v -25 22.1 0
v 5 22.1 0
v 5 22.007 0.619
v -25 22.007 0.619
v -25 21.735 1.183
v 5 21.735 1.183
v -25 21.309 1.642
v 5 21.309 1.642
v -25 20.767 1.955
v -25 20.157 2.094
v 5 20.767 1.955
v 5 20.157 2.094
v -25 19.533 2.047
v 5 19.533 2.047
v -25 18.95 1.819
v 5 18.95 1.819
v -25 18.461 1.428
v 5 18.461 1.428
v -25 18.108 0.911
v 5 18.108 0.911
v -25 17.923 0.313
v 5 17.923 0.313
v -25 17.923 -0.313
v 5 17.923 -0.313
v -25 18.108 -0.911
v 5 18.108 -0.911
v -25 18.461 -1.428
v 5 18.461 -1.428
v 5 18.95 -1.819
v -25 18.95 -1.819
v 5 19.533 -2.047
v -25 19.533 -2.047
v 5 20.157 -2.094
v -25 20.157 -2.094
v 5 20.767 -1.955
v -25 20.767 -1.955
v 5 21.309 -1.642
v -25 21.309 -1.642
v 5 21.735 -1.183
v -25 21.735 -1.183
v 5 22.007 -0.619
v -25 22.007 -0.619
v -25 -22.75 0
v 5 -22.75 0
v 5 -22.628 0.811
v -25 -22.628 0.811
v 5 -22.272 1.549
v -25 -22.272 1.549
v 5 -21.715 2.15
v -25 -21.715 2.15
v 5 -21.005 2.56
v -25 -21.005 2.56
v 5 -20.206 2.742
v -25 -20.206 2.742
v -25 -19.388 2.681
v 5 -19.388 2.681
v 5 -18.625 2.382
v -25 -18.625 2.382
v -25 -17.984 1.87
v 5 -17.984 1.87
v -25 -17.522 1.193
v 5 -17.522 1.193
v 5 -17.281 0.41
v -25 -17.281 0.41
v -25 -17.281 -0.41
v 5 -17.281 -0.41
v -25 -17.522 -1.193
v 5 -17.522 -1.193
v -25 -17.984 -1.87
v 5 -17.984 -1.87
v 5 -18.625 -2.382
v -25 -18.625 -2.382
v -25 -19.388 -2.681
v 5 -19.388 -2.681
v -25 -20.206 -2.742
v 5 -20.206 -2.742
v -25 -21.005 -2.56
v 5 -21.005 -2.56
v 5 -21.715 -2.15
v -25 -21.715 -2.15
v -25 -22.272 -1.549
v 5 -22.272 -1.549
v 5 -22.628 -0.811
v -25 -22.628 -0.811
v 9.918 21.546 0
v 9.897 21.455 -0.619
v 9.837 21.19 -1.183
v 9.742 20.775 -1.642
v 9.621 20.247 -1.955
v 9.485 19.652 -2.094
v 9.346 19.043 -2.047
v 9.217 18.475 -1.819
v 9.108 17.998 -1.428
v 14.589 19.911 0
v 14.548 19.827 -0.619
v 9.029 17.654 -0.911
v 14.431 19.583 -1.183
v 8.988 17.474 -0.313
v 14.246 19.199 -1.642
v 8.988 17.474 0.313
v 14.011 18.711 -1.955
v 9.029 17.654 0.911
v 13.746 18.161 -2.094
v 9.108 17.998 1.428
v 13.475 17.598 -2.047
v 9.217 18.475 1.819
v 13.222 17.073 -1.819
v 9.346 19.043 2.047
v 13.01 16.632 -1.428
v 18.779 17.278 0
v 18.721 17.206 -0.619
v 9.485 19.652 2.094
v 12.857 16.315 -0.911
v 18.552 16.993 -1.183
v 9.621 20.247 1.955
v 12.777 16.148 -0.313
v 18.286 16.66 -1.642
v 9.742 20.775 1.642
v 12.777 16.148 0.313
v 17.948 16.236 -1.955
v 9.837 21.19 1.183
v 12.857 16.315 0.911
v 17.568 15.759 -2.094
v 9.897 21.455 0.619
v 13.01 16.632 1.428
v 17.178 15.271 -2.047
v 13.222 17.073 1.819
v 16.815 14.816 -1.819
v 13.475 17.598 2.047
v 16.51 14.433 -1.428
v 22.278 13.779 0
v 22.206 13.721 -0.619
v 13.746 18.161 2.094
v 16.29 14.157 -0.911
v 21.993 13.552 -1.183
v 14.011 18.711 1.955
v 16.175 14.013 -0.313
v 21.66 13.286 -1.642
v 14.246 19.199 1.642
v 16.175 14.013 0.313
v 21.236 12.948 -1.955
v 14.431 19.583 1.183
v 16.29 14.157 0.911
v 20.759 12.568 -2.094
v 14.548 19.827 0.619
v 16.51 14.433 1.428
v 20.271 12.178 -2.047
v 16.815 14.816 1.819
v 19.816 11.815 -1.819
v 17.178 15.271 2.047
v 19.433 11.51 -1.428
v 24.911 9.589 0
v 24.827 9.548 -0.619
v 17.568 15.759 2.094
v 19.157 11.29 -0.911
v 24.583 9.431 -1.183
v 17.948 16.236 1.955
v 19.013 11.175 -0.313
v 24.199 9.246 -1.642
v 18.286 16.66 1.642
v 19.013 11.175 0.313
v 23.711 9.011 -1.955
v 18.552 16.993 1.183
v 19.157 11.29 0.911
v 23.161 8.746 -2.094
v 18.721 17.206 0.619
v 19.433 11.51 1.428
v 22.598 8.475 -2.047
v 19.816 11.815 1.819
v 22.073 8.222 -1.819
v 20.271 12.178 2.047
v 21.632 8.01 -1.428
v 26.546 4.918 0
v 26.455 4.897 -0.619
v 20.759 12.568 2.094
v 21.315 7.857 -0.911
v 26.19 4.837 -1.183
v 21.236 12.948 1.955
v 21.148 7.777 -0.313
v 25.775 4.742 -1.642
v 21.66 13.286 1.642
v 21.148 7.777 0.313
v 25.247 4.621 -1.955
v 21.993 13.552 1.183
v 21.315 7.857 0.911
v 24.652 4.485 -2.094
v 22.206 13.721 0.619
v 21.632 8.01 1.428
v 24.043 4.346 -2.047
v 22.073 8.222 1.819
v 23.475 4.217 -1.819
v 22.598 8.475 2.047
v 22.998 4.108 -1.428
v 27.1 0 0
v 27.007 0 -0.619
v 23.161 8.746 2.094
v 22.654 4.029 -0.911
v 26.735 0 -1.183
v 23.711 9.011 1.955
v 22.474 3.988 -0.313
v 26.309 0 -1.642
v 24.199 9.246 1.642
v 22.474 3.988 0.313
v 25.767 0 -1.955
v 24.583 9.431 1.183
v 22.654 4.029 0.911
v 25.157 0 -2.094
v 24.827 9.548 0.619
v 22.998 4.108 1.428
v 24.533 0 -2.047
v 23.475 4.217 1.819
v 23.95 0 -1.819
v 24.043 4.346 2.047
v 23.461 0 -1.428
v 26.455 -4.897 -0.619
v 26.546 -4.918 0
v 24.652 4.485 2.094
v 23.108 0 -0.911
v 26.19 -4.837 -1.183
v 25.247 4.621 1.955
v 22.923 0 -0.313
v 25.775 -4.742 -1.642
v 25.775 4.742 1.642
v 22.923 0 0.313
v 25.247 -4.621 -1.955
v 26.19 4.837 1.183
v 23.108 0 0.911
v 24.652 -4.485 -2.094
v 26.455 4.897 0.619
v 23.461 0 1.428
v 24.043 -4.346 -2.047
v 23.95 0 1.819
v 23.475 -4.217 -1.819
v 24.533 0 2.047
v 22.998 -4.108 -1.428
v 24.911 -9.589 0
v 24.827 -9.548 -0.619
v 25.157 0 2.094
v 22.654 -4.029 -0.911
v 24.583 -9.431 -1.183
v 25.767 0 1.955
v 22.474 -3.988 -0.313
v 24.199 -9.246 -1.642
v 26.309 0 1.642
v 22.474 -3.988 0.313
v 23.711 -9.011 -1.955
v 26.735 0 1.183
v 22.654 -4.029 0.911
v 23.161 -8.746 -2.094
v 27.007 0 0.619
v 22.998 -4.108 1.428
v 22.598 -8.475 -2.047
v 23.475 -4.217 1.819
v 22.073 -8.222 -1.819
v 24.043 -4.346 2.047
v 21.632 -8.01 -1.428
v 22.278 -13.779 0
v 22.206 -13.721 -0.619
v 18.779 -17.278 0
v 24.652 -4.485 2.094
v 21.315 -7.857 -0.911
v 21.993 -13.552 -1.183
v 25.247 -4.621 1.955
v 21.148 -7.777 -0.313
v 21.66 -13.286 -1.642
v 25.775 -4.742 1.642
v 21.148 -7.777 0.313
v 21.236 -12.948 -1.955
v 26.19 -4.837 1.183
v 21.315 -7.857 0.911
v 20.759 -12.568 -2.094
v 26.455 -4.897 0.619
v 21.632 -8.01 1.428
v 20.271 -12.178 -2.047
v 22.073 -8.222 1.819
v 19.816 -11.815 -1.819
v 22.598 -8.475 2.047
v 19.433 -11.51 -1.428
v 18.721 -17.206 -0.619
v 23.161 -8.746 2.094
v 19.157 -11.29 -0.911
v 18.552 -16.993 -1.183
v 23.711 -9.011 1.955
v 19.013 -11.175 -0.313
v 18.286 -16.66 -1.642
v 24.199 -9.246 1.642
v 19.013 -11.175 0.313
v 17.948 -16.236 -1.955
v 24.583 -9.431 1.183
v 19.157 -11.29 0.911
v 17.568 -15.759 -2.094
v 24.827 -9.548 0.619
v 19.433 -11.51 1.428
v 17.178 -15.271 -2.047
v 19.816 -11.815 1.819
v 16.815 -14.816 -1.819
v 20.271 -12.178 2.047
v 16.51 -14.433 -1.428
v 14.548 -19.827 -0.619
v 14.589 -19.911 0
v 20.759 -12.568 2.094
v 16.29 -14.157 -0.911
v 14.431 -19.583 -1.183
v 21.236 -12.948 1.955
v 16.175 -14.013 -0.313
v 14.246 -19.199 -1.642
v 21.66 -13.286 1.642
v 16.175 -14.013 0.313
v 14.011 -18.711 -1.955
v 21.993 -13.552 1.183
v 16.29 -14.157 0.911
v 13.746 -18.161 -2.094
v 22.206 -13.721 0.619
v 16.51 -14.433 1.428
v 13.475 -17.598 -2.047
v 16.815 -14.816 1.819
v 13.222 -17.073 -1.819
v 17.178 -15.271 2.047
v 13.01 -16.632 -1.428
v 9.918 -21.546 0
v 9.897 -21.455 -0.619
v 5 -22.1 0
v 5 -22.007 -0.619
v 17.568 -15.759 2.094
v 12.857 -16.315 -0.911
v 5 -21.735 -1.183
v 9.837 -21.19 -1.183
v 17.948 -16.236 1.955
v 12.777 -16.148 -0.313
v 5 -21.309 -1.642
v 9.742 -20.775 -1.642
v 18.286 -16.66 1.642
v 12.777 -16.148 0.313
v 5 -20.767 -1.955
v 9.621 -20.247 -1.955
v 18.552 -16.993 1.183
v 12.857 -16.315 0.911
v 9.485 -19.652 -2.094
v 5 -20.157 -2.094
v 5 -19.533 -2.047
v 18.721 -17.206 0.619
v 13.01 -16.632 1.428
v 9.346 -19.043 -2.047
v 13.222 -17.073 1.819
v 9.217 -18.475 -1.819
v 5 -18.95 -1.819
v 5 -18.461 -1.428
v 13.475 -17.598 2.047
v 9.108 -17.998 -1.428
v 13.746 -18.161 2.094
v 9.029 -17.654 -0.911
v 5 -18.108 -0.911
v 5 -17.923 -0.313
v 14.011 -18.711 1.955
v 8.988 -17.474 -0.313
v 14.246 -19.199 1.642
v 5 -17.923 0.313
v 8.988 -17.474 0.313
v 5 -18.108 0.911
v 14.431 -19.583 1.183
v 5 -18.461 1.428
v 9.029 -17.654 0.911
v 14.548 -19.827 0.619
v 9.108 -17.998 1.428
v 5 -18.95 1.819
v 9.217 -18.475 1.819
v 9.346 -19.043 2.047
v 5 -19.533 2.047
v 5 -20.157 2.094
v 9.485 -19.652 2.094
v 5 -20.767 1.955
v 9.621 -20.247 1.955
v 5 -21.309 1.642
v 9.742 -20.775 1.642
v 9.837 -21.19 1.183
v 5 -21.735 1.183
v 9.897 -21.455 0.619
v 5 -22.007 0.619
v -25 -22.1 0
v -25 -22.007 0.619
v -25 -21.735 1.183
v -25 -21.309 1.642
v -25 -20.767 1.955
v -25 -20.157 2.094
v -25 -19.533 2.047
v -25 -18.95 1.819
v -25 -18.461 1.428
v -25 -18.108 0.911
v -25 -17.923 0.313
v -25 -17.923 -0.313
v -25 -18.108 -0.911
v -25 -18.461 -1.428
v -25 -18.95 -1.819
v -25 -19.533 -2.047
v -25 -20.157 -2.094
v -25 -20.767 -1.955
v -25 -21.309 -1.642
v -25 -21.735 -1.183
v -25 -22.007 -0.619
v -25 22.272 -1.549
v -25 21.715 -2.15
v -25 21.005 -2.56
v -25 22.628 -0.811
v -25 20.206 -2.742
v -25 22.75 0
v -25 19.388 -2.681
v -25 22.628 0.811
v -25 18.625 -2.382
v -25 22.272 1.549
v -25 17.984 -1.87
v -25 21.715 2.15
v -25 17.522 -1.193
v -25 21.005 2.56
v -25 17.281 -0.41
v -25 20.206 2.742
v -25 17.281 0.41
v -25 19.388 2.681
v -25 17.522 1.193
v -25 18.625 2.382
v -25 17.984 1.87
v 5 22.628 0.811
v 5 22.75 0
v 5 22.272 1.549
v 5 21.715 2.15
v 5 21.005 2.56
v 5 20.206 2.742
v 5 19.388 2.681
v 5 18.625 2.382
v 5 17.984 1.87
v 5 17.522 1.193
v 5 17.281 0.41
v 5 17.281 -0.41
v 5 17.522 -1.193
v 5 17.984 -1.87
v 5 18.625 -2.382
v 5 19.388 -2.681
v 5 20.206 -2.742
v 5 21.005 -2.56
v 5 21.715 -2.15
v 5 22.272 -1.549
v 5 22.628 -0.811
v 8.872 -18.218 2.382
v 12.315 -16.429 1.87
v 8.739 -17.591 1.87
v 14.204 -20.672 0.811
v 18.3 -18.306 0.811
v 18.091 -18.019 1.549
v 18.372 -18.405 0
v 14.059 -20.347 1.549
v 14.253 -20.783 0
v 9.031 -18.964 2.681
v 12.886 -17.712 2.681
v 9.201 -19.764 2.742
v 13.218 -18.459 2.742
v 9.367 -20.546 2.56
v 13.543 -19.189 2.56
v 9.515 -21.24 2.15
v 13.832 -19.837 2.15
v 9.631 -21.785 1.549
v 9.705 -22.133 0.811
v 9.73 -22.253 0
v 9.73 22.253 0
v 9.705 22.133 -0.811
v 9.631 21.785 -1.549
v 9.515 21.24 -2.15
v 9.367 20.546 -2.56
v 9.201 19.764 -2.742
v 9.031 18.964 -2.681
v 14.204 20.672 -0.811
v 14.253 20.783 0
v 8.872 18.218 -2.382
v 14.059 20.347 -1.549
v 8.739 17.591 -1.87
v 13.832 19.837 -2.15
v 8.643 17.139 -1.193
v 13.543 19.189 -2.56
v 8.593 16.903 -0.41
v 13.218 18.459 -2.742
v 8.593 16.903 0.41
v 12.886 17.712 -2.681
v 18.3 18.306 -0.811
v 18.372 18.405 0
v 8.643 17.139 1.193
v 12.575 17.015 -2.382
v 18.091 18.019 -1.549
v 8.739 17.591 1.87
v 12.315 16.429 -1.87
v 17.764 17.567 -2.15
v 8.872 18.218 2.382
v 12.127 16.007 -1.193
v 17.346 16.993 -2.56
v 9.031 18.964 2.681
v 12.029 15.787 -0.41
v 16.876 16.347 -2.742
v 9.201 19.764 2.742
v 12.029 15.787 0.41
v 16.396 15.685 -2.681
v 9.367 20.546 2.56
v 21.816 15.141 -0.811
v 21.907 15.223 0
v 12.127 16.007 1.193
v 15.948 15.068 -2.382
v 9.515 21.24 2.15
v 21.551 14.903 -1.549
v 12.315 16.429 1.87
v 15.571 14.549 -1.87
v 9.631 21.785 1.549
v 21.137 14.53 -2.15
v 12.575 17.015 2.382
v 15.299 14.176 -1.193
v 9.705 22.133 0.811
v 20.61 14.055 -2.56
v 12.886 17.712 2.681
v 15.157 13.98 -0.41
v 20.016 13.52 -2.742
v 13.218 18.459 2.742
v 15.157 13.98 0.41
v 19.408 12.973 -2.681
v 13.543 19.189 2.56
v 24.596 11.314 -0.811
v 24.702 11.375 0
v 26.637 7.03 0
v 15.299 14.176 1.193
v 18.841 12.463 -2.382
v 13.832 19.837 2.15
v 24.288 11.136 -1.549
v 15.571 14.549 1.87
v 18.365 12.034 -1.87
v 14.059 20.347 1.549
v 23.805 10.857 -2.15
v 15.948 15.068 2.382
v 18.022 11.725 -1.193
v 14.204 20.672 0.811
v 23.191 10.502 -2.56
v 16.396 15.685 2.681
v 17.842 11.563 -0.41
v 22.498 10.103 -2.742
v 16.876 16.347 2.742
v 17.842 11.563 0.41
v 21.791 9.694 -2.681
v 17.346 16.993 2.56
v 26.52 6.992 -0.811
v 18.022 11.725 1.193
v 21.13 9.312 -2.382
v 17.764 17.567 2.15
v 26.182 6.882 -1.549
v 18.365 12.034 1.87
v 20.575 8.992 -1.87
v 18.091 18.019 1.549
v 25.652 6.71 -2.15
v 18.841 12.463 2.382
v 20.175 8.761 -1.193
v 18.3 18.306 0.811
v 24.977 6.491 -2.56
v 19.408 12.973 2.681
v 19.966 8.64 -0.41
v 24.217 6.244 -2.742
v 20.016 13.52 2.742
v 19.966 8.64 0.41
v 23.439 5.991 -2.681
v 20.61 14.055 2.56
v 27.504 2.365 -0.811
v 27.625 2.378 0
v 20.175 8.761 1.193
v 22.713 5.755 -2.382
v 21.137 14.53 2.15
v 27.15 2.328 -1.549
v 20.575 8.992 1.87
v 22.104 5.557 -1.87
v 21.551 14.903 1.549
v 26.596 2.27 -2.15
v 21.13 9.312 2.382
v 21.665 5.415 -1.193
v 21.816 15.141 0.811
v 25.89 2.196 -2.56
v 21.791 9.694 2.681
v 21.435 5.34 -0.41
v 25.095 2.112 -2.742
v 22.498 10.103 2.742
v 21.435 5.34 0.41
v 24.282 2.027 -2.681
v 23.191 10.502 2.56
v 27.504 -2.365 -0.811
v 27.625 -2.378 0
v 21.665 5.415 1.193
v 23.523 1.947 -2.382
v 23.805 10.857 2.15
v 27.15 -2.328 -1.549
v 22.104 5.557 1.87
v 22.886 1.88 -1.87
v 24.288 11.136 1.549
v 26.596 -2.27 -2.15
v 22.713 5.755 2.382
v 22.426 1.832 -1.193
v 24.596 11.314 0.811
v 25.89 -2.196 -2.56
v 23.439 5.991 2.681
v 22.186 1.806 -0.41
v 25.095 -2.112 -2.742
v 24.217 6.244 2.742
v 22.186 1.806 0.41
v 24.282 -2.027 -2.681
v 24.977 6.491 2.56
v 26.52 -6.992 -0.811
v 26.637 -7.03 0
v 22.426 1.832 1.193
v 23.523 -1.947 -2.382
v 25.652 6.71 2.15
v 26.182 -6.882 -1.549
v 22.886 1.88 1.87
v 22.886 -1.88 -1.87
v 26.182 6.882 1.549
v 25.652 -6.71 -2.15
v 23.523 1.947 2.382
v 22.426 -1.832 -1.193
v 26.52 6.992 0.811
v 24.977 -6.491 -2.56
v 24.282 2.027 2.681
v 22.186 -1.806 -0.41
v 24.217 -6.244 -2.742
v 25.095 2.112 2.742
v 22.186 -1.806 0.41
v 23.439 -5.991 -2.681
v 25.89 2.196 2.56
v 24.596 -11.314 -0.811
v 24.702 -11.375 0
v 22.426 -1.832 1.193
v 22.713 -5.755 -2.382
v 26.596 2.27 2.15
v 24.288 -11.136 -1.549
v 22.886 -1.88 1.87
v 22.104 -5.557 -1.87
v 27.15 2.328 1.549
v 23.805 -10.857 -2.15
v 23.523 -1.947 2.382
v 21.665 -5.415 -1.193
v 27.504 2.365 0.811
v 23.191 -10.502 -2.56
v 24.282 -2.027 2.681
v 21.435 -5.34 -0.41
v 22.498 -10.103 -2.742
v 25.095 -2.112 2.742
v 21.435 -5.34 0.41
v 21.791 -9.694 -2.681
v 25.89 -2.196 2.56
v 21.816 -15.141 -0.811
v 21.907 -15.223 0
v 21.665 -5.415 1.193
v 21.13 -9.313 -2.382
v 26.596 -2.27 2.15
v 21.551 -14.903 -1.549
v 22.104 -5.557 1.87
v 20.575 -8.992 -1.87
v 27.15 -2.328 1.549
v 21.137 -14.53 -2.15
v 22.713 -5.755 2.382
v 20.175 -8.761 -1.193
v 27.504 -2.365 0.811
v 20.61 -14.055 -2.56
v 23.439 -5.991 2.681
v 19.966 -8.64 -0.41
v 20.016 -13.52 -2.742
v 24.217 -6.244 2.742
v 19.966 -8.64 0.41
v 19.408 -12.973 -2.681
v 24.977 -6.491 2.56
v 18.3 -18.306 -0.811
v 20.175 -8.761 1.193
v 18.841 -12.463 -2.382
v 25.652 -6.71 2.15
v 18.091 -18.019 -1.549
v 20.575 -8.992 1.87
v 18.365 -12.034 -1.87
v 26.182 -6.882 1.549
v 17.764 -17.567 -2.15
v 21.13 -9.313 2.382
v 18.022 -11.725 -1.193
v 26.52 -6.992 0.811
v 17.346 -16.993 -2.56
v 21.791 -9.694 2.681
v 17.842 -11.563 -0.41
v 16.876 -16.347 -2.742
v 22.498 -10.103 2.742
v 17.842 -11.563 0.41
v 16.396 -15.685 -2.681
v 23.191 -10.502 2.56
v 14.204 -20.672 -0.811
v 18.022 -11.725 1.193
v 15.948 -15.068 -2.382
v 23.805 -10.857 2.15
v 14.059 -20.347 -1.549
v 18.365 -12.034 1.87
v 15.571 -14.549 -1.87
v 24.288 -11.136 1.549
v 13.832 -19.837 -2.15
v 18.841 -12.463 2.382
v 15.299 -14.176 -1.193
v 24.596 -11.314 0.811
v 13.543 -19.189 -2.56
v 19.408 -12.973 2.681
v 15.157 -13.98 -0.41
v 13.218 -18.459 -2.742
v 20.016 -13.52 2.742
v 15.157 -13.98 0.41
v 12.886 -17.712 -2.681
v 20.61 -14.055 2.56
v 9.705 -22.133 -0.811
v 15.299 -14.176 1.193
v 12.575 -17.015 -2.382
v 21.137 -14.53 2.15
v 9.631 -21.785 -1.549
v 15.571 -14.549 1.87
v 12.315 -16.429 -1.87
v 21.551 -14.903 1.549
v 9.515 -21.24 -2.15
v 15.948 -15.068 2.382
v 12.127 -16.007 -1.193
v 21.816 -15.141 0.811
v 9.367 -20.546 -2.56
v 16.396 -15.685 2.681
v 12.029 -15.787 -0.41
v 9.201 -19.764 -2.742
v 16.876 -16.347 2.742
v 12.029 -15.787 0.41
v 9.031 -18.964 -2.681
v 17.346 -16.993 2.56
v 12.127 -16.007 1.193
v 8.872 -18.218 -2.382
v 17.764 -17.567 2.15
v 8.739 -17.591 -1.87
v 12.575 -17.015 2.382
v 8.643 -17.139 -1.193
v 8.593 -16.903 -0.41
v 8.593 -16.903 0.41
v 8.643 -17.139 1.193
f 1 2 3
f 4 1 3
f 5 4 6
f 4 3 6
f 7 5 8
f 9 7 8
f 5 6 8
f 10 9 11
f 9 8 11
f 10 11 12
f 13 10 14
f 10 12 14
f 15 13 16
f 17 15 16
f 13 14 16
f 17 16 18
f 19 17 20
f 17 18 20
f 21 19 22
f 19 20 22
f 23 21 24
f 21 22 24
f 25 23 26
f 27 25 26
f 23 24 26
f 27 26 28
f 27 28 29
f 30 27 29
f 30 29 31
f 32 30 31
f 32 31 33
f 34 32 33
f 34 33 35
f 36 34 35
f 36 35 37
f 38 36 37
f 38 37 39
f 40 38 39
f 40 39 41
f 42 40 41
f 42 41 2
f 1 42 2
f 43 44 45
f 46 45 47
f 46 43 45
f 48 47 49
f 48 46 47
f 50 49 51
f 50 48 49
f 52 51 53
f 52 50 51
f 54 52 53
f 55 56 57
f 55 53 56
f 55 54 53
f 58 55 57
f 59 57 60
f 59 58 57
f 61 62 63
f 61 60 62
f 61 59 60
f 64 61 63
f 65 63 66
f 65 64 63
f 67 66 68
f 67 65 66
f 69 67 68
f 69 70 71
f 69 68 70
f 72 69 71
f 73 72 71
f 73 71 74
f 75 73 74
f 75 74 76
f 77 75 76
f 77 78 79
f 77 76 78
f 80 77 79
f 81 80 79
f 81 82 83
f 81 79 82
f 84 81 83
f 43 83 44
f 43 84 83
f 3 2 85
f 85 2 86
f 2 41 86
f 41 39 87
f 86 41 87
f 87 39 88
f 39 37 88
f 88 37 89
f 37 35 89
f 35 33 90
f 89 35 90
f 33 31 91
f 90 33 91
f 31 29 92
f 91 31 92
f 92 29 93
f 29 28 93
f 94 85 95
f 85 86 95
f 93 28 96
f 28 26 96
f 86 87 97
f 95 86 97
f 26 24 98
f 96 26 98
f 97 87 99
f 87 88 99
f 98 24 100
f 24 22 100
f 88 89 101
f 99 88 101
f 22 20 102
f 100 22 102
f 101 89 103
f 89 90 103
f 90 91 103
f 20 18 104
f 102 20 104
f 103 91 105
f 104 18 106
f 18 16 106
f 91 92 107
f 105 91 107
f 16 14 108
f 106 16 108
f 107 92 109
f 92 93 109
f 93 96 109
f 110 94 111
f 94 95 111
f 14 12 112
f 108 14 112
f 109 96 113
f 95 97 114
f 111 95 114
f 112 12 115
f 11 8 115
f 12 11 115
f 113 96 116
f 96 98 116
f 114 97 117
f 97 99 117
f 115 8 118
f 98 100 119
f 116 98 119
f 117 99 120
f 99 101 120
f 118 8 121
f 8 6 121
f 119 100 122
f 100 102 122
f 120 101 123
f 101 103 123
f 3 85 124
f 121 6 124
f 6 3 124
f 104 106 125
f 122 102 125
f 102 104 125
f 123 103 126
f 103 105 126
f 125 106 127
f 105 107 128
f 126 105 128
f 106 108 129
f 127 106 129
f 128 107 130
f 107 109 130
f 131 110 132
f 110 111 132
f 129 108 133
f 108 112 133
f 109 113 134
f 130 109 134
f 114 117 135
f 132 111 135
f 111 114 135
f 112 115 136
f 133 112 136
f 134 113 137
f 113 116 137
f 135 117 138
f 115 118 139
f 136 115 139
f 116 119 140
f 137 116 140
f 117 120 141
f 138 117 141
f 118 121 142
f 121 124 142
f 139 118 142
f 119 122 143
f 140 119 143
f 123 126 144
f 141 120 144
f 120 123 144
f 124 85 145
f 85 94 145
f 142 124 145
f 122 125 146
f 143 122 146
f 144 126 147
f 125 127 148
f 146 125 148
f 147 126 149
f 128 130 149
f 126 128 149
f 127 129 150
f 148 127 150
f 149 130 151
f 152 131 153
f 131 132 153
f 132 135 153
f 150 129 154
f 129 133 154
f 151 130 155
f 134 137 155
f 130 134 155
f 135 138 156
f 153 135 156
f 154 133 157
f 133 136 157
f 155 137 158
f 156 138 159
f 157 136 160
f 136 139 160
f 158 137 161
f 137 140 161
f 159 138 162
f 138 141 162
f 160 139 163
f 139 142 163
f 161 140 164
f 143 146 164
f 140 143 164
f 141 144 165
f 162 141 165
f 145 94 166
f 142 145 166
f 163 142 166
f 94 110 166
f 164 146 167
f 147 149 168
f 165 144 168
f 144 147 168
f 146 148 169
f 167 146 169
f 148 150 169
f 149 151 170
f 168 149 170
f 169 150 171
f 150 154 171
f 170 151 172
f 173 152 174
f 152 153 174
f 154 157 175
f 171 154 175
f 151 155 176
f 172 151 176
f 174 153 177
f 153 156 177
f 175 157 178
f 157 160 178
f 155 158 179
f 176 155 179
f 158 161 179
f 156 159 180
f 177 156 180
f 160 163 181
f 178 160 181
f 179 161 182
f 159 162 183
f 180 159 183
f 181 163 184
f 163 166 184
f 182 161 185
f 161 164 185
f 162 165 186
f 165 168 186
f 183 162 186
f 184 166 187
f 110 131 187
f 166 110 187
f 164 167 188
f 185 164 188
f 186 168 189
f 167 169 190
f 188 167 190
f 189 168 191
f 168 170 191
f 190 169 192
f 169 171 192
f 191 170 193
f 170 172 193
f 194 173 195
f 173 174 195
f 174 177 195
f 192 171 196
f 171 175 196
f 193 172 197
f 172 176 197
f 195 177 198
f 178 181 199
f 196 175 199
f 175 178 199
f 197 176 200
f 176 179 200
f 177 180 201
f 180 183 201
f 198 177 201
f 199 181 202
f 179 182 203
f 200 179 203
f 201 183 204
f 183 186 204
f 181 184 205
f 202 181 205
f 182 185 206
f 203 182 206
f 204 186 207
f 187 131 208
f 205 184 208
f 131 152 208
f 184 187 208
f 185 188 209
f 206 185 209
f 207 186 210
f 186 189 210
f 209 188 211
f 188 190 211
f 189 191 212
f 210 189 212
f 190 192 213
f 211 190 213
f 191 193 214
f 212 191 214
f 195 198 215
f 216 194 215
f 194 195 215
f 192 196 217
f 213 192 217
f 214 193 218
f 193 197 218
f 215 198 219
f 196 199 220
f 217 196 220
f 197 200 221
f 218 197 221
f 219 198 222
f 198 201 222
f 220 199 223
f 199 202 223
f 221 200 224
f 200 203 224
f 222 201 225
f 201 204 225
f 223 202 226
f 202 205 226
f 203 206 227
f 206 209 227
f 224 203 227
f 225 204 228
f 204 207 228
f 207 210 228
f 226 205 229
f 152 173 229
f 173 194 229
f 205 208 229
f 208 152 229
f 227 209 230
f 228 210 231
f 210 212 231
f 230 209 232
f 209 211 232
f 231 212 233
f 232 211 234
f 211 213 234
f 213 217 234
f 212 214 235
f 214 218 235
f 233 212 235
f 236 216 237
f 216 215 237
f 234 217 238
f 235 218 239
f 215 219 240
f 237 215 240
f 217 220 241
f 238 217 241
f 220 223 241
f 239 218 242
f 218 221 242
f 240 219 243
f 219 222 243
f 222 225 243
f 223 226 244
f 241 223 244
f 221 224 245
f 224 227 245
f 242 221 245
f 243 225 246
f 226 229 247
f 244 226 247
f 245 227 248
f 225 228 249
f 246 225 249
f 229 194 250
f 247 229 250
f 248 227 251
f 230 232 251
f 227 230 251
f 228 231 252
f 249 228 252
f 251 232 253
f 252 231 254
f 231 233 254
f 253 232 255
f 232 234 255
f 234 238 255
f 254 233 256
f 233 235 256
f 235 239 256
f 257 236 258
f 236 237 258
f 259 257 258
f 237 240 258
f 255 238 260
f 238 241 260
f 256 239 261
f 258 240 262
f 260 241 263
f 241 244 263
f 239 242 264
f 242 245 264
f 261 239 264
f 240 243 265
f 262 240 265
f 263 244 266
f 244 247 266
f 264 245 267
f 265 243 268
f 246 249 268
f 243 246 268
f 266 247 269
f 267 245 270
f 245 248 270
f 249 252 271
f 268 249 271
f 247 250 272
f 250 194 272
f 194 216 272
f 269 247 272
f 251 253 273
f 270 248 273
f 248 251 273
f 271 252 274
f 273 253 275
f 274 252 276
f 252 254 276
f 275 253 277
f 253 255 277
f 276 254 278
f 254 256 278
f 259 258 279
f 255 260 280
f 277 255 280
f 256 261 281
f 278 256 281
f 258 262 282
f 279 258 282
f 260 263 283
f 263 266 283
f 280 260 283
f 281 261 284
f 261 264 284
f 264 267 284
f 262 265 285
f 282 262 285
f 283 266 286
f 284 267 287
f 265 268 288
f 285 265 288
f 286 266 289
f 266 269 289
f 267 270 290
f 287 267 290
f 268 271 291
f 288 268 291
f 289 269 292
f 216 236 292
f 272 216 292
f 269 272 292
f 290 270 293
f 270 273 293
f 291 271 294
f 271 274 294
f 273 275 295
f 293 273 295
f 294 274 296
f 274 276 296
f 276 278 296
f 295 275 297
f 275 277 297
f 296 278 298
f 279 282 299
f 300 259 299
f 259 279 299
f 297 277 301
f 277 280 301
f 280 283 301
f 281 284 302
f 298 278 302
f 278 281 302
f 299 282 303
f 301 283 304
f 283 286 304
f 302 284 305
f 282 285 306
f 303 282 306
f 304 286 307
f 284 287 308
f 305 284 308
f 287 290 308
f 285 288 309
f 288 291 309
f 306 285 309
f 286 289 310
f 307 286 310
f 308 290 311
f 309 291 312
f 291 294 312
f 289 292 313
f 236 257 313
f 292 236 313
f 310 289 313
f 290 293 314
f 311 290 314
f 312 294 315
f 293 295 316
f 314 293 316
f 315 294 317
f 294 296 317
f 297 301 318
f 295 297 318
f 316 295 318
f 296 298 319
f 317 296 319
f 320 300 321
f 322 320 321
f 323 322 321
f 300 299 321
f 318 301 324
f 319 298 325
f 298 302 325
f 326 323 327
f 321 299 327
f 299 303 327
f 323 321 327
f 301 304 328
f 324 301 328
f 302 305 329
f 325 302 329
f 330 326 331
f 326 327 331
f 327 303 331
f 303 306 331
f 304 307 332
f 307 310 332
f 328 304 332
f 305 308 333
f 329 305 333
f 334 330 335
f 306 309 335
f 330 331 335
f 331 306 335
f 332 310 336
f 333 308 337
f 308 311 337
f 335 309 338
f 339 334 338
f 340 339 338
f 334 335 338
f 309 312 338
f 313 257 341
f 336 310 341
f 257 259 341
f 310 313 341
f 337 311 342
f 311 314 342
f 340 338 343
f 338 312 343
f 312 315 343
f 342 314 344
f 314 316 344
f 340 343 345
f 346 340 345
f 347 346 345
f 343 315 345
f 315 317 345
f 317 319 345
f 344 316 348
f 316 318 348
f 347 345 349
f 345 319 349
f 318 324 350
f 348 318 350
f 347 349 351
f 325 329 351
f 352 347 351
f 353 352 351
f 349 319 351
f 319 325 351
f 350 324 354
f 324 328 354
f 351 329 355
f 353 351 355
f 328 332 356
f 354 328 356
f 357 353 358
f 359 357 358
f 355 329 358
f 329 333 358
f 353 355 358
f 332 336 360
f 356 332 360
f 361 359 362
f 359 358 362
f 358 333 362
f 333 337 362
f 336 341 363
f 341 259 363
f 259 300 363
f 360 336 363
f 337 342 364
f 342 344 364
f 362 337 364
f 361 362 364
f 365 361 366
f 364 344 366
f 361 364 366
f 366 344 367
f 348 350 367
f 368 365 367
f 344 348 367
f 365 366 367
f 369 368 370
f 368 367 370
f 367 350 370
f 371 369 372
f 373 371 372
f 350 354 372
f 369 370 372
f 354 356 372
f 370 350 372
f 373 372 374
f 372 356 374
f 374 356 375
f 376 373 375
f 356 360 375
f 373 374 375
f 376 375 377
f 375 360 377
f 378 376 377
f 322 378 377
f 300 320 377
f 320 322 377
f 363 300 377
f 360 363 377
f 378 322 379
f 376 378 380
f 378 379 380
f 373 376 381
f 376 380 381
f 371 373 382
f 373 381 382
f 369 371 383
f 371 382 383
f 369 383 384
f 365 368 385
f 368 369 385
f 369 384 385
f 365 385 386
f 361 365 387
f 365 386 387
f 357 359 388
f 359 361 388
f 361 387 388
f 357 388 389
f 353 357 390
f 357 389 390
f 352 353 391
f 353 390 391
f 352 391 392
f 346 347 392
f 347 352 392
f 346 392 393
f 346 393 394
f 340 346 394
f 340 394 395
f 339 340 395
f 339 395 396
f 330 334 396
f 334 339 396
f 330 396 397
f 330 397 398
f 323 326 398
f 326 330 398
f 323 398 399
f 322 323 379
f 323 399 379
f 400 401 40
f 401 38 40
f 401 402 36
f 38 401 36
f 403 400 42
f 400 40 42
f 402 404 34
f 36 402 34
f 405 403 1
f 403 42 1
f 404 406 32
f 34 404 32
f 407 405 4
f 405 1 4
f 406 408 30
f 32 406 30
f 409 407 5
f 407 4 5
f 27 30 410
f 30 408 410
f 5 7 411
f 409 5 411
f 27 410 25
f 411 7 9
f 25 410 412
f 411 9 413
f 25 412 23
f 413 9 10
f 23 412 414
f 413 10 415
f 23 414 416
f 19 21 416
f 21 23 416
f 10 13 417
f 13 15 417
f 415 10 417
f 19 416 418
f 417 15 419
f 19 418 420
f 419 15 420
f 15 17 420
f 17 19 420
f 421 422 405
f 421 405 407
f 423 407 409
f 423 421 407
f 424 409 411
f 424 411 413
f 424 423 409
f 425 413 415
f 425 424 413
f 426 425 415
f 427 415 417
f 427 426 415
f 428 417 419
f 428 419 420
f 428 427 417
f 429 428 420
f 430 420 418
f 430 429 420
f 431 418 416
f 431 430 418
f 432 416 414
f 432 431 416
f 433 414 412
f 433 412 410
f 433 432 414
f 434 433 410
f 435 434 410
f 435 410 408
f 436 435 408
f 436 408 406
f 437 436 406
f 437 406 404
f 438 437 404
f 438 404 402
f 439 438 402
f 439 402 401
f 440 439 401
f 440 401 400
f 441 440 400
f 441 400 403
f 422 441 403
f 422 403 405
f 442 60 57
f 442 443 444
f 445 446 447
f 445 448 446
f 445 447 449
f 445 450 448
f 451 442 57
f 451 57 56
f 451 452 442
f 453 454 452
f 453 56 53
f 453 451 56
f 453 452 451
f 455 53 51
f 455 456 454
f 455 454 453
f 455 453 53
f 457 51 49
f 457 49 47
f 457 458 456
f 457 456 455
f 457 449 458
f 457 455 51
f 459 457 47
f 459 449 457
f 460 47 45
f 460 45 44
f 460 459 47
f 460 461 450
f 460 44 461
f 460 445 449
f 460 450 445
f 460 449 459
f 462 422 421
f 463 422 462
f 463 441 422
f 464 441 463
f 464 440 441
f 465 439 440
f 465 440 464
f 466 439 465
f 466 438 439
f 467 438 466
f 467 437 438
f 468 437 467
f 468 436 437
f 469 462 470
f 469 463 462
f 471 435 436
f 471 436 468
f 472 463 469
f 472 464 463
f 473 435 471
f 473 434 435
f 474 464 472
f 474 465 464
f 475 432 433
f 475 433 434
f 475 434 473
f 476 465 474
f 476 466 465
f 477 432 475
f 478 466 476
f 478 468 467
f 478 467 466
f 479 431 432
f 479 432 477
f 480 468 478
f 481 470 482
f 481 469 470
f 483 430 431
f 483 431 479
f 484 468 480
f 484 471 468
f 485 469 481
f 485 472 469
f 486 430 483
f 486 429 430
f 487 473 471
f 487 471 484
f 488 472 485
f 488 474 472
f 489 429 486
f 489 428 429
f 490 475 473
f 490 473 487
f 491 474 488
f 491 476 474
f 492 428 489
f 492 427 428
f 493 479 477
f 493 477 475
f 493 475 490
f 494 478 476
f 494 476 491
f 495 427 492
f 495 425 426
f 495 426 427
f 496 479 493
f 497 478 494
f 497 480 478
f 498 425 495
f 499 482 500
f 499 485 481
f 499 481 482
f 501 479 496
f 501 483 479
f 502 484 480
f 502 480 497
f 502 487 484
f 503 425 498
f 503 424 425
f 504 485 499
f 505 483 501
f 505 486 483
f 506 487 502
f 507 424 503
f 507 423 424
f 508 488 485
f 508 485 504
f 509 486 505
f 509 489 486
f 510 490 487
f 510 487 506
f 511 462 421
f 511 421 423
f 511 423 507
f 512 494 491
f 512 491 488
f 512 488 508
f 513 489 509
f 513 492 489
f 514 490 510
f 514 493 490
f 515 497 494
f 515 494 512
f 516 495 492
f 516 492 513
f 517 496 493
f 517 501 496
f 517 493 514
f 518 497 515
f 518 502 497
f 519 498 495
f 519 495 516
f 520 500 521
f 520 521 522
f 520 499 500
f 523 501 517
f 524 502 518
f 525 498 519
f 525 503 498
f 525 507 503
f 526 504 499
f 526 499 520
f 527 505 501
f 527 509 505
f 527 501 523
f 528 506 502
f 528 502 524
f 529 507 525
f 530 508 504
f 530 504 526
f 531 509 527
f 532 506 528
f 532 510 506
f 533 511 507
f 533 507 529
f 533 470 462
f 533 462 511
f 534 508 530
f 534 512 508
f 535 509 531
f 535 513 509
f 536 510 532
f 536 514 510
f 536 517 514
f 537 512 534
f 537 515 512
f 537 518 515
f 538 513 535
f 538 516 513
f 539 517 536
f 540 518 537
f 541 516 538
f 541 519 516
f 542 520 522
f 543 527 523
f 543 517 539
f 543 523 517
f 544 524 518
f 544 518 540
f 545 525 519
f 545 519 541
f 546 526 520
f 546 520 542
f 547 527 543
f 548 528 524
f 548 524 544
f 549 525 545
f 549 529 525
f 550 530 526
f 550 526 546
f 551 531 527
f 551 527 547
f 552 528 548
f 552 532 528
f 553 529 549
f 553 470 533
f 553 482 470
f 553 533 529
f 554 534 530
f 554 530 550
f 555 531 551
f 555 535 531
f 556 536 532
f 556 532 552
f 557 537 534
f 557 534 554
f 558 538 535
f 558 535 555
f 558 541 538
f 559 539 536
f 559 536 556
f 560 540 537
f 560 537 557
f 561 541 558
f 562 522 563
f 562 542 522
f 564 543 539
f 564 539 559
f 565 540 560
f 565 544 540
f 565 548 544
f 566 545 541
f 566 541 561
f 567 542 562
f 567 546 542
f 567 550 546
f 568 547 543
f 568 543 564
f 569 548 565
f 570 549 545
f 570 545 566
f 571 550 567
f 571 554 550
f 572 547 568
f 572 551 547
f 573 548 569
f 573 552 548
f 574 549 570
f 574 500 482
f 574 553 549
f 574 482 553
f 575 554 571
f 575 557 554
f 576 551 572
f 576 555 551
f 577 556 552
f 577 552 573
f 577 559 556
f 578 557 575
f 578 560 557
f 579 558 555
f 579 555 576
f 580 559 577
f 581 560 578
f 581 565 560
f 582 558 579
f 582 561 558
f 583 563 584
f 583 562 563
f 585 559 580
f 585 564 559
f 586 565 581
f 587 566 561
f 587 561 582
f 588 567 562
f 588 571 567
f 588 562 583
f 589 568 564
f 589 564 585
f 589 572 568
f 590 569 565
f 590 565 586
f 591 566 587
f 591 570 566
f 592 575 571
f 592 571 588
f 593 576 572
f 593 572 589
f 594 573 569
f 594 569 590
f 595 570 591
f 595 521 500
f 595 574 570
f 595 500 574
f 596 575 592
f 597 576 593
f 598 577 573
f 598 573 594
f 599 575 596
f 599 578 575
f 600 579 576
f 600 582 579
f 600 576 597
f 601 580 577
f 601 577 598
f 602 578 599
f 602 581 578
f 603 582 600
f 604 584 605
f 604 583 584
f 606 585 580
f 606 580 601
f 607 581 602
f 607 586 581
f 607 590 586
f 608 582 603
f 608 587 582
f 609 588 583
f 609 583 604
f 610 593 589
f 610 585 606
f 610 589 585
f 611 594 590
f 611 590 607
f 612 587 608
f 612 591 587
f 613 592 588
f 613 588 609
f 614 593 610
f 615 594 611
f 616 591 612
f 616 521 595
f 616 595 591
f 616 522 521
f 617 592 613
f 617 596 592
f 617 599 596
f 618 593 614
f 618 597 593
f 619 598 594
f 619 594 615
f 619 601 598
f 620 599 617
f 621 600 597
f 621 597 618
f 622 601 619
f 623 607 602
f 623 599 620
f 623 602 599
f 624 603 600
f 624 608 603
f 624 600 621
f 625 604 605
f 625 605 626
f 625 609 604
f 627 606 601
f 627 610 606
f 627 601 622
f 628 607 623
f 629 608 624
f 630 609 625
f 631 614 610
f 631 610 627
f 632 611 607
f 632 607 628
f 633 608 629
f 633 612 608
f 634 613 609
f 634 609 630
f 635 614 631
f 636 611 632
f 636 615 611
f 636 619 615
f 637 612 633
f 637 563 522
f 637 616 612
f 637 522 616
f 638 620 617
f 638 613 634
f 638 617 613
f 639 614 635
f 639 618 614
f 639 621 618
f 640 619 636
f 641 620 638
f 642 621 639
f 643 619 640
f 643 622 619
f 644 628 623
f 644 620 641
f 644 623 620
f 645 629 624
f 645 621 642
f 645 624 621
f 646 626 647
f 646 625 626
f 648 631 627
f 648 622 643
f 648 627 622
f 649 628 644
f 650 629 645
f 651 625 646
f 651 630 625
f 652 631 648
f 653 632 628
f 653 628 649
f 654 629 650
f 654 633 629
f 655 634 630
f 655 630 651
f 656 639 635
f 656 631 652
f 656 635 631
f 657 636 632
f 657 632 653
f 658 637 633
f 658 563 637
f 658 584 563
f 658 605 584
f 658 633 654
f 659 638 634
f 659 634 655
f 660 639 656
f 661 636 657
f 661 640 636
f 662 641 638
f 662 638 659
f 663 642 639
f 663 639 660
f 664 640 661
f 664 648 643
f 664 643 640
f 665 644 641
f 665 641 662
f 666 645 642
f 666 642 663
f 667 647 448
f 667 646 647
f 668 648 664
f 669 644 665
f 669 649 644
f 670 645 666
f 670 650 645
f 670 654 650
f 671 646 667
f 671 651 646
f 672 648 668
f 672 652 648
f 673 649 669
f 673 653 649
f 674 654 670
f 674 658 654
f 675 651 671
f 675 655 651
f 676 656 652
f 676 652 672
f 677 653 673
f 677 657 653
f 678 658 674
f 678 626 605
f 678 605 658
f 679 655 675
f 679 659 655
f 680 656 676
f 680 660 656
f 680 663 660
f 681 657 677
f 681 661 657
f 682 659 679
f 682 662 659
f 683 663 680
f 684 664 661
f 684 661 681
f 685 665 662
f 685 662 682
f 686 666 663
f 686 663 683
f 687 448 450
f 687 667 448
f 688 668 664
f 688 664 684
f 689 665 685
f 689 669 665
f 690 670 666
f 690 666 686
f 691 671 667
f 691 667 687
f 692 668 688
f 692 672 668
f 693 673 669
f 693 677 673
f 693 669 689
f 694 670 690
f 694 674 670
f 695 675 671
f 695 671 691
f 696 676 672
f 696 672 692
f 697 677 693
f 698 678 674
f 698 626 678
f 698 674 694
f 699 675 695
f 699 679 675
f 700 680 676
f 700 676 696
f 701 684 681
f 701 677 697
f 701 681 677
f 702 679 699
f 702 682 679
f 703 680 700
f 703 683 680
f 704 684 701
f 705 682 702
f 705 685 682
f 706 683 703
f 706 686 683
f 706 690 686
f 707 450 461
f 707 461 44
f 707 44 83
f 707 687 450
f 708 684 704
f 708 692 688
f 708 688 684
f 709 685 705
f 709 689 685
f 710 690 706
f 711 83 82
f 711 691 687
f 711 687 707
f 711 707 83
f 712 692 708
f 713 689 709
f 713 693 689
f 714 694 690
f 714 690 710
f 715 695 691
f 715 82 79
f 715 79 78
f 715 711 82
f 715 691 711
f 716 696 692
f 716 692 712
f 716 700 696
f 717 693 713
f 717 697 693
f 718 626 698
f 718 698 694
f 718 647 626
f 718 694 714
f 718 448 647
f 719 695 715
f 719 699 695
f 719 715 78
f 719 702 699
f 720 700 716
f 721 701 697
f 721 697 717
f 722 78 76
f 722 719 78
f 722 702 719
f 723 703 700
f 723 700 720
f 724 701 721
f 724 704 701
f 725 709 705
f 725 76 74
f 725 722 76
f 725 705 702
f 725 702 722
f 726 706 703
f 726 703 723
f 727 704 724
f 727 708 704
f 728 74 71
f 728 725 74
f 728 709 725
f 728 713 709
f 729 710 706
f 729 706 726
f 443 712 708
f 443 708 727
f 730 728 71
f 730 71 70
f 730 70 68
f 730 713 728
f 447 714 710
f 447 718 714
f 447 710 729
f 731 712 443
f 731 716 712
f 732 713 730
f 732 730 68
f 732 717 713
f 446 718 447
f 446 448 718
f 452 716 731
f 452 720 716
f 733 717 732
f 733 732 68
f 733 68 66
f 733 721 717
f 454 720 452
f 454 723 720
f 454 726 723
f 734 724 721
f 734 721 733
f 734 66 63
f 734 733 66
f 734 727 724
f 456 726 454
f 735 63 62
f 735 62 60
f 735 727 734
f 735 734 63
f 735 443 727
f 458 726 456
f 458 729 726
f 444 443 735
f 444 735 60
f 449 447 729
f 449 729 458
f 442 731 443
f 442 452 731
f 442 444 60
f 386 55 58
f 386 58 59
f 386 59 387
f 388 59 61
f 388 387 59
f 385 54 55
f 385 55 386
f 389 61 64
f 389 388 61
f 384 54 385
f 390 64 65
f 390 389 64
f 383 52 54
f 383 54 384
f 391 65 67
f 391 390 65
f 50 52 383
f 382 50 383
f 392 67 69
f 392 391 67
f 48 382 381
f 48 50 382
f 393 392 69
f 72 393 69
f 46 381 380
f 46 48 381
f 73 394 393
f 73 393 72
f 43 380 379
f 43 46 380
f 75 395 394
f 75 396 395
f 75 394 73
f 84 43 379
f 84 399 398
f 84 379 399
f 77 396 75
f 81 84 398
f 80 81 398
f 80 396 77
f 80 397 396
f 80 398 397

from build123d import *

# Parameters (mm, degrees)
F2_R   = 2.75
F2_R_2 = 2.1


with BuildPart() as f3:
    # F3: sweep along a path in F0
    with BuildLine(Plane.XY) as f3_path:
        Line((-25, 20), (5, 20))
        ThreePointArc((5, 20), (25, 0), (5, -20))
        Line((5, -20), (-25, -20))
    # F2 (on offset) → F3 (sweep)
    with BuildSketch(Plane.YZ.offset(-25)):
        with Locations((20, 0)):
            Circle(F2_R)
        with Locations((20, 0)):
            Circle(F2_R_2, mode=Mode.SUBTRACT)
    sweep(path=f3_path.line)


solid = f3.part
